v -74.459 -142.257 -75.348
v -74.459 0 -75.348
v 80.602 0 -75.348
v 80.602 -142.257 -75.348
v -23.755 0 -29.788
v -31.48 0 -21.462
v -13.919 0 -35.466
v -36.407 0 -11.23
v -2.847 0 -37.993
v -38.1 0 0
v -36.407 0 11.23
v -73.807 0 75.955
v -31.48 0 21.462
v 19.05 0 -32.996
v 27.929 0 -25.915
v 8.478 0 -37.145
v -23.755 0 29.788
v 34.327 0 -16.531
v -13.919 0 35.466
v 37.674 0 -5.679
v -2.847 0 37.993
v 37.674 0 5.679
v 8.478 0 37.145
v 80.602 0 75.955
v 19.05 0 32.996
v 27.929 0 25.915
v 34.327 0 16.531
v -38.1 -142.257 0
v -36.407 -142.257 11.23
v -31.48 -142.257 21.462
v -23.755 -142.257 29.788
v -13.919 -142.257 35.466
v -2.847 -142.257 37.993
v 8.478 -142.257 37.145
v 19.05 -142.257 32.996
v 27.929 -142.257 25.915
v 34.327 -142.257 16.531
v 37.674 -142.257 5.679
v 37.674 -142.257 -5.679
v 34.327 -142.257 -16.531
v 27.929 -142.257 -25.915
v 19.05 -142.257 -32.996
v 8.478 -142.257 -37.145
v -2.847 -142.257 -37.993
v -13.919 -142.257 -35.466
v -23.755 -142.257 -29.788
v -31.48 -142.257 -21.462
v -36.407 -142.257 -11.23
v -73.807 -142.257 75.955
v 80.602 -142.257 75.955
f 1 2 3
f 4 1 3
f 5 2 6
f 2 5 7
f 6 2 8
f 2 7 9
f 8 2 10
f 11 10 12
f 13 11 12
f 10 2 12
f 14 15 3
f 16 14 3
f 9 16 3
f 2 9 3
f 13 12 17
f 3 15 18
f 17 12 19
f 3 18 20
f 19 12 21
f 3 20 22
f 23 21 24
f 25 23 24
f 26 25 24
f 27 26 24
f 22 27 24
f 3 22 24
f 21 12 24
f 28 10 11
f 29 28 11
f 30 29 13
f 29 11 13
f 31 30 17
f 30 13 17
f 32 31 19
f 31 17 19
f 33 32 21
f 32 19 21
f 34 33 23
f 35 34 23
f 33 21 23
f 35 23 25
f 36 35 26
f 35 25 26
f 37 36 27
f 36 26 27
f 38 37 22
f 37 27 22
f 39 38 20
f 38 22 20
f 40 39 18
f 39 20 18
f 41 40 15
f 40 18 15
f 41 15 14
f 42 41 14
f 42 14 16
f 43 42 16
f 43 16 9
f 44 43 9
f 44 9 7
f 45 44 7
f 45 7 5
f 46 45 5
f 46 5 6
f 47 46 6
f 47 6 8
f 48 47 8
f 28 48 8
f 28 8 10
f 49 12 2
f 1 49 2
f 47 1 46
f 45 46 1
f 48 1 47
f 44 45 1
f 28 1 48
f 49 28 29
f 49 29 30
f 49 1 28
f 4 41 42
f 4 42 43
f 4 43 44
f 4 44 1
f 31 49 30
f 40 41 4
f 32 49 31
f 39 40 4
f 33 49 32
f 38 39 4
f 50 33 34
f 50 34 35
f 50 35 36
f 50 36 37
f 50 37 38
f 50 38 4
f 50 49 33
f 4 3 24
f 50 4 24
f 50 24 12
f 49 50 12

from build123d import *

# Parameters (mm, degrees)
F2_DEPTH = 142.2567795962
F4_D     = 76.2


with BuildPart() as f2:
    # F1 (on face) → F2 (new body)
    with BuildSketch(Plane.XZ):
        Polygon((80.6021243334, 75.9551972151), (-73.8069862127, 75.9551972151), (-74.4586139917, -75.3483995795), (80.6021243334, -75.3483995795), align=None)
    extrude(amount=F2_DEPTH)

    # F4 (through all)
    with Locations(Plane.XZ.offset(142.2567795962)):
        with Locations((0, 0)):
            Hole(F4_D / 2)


solid = f2.part
